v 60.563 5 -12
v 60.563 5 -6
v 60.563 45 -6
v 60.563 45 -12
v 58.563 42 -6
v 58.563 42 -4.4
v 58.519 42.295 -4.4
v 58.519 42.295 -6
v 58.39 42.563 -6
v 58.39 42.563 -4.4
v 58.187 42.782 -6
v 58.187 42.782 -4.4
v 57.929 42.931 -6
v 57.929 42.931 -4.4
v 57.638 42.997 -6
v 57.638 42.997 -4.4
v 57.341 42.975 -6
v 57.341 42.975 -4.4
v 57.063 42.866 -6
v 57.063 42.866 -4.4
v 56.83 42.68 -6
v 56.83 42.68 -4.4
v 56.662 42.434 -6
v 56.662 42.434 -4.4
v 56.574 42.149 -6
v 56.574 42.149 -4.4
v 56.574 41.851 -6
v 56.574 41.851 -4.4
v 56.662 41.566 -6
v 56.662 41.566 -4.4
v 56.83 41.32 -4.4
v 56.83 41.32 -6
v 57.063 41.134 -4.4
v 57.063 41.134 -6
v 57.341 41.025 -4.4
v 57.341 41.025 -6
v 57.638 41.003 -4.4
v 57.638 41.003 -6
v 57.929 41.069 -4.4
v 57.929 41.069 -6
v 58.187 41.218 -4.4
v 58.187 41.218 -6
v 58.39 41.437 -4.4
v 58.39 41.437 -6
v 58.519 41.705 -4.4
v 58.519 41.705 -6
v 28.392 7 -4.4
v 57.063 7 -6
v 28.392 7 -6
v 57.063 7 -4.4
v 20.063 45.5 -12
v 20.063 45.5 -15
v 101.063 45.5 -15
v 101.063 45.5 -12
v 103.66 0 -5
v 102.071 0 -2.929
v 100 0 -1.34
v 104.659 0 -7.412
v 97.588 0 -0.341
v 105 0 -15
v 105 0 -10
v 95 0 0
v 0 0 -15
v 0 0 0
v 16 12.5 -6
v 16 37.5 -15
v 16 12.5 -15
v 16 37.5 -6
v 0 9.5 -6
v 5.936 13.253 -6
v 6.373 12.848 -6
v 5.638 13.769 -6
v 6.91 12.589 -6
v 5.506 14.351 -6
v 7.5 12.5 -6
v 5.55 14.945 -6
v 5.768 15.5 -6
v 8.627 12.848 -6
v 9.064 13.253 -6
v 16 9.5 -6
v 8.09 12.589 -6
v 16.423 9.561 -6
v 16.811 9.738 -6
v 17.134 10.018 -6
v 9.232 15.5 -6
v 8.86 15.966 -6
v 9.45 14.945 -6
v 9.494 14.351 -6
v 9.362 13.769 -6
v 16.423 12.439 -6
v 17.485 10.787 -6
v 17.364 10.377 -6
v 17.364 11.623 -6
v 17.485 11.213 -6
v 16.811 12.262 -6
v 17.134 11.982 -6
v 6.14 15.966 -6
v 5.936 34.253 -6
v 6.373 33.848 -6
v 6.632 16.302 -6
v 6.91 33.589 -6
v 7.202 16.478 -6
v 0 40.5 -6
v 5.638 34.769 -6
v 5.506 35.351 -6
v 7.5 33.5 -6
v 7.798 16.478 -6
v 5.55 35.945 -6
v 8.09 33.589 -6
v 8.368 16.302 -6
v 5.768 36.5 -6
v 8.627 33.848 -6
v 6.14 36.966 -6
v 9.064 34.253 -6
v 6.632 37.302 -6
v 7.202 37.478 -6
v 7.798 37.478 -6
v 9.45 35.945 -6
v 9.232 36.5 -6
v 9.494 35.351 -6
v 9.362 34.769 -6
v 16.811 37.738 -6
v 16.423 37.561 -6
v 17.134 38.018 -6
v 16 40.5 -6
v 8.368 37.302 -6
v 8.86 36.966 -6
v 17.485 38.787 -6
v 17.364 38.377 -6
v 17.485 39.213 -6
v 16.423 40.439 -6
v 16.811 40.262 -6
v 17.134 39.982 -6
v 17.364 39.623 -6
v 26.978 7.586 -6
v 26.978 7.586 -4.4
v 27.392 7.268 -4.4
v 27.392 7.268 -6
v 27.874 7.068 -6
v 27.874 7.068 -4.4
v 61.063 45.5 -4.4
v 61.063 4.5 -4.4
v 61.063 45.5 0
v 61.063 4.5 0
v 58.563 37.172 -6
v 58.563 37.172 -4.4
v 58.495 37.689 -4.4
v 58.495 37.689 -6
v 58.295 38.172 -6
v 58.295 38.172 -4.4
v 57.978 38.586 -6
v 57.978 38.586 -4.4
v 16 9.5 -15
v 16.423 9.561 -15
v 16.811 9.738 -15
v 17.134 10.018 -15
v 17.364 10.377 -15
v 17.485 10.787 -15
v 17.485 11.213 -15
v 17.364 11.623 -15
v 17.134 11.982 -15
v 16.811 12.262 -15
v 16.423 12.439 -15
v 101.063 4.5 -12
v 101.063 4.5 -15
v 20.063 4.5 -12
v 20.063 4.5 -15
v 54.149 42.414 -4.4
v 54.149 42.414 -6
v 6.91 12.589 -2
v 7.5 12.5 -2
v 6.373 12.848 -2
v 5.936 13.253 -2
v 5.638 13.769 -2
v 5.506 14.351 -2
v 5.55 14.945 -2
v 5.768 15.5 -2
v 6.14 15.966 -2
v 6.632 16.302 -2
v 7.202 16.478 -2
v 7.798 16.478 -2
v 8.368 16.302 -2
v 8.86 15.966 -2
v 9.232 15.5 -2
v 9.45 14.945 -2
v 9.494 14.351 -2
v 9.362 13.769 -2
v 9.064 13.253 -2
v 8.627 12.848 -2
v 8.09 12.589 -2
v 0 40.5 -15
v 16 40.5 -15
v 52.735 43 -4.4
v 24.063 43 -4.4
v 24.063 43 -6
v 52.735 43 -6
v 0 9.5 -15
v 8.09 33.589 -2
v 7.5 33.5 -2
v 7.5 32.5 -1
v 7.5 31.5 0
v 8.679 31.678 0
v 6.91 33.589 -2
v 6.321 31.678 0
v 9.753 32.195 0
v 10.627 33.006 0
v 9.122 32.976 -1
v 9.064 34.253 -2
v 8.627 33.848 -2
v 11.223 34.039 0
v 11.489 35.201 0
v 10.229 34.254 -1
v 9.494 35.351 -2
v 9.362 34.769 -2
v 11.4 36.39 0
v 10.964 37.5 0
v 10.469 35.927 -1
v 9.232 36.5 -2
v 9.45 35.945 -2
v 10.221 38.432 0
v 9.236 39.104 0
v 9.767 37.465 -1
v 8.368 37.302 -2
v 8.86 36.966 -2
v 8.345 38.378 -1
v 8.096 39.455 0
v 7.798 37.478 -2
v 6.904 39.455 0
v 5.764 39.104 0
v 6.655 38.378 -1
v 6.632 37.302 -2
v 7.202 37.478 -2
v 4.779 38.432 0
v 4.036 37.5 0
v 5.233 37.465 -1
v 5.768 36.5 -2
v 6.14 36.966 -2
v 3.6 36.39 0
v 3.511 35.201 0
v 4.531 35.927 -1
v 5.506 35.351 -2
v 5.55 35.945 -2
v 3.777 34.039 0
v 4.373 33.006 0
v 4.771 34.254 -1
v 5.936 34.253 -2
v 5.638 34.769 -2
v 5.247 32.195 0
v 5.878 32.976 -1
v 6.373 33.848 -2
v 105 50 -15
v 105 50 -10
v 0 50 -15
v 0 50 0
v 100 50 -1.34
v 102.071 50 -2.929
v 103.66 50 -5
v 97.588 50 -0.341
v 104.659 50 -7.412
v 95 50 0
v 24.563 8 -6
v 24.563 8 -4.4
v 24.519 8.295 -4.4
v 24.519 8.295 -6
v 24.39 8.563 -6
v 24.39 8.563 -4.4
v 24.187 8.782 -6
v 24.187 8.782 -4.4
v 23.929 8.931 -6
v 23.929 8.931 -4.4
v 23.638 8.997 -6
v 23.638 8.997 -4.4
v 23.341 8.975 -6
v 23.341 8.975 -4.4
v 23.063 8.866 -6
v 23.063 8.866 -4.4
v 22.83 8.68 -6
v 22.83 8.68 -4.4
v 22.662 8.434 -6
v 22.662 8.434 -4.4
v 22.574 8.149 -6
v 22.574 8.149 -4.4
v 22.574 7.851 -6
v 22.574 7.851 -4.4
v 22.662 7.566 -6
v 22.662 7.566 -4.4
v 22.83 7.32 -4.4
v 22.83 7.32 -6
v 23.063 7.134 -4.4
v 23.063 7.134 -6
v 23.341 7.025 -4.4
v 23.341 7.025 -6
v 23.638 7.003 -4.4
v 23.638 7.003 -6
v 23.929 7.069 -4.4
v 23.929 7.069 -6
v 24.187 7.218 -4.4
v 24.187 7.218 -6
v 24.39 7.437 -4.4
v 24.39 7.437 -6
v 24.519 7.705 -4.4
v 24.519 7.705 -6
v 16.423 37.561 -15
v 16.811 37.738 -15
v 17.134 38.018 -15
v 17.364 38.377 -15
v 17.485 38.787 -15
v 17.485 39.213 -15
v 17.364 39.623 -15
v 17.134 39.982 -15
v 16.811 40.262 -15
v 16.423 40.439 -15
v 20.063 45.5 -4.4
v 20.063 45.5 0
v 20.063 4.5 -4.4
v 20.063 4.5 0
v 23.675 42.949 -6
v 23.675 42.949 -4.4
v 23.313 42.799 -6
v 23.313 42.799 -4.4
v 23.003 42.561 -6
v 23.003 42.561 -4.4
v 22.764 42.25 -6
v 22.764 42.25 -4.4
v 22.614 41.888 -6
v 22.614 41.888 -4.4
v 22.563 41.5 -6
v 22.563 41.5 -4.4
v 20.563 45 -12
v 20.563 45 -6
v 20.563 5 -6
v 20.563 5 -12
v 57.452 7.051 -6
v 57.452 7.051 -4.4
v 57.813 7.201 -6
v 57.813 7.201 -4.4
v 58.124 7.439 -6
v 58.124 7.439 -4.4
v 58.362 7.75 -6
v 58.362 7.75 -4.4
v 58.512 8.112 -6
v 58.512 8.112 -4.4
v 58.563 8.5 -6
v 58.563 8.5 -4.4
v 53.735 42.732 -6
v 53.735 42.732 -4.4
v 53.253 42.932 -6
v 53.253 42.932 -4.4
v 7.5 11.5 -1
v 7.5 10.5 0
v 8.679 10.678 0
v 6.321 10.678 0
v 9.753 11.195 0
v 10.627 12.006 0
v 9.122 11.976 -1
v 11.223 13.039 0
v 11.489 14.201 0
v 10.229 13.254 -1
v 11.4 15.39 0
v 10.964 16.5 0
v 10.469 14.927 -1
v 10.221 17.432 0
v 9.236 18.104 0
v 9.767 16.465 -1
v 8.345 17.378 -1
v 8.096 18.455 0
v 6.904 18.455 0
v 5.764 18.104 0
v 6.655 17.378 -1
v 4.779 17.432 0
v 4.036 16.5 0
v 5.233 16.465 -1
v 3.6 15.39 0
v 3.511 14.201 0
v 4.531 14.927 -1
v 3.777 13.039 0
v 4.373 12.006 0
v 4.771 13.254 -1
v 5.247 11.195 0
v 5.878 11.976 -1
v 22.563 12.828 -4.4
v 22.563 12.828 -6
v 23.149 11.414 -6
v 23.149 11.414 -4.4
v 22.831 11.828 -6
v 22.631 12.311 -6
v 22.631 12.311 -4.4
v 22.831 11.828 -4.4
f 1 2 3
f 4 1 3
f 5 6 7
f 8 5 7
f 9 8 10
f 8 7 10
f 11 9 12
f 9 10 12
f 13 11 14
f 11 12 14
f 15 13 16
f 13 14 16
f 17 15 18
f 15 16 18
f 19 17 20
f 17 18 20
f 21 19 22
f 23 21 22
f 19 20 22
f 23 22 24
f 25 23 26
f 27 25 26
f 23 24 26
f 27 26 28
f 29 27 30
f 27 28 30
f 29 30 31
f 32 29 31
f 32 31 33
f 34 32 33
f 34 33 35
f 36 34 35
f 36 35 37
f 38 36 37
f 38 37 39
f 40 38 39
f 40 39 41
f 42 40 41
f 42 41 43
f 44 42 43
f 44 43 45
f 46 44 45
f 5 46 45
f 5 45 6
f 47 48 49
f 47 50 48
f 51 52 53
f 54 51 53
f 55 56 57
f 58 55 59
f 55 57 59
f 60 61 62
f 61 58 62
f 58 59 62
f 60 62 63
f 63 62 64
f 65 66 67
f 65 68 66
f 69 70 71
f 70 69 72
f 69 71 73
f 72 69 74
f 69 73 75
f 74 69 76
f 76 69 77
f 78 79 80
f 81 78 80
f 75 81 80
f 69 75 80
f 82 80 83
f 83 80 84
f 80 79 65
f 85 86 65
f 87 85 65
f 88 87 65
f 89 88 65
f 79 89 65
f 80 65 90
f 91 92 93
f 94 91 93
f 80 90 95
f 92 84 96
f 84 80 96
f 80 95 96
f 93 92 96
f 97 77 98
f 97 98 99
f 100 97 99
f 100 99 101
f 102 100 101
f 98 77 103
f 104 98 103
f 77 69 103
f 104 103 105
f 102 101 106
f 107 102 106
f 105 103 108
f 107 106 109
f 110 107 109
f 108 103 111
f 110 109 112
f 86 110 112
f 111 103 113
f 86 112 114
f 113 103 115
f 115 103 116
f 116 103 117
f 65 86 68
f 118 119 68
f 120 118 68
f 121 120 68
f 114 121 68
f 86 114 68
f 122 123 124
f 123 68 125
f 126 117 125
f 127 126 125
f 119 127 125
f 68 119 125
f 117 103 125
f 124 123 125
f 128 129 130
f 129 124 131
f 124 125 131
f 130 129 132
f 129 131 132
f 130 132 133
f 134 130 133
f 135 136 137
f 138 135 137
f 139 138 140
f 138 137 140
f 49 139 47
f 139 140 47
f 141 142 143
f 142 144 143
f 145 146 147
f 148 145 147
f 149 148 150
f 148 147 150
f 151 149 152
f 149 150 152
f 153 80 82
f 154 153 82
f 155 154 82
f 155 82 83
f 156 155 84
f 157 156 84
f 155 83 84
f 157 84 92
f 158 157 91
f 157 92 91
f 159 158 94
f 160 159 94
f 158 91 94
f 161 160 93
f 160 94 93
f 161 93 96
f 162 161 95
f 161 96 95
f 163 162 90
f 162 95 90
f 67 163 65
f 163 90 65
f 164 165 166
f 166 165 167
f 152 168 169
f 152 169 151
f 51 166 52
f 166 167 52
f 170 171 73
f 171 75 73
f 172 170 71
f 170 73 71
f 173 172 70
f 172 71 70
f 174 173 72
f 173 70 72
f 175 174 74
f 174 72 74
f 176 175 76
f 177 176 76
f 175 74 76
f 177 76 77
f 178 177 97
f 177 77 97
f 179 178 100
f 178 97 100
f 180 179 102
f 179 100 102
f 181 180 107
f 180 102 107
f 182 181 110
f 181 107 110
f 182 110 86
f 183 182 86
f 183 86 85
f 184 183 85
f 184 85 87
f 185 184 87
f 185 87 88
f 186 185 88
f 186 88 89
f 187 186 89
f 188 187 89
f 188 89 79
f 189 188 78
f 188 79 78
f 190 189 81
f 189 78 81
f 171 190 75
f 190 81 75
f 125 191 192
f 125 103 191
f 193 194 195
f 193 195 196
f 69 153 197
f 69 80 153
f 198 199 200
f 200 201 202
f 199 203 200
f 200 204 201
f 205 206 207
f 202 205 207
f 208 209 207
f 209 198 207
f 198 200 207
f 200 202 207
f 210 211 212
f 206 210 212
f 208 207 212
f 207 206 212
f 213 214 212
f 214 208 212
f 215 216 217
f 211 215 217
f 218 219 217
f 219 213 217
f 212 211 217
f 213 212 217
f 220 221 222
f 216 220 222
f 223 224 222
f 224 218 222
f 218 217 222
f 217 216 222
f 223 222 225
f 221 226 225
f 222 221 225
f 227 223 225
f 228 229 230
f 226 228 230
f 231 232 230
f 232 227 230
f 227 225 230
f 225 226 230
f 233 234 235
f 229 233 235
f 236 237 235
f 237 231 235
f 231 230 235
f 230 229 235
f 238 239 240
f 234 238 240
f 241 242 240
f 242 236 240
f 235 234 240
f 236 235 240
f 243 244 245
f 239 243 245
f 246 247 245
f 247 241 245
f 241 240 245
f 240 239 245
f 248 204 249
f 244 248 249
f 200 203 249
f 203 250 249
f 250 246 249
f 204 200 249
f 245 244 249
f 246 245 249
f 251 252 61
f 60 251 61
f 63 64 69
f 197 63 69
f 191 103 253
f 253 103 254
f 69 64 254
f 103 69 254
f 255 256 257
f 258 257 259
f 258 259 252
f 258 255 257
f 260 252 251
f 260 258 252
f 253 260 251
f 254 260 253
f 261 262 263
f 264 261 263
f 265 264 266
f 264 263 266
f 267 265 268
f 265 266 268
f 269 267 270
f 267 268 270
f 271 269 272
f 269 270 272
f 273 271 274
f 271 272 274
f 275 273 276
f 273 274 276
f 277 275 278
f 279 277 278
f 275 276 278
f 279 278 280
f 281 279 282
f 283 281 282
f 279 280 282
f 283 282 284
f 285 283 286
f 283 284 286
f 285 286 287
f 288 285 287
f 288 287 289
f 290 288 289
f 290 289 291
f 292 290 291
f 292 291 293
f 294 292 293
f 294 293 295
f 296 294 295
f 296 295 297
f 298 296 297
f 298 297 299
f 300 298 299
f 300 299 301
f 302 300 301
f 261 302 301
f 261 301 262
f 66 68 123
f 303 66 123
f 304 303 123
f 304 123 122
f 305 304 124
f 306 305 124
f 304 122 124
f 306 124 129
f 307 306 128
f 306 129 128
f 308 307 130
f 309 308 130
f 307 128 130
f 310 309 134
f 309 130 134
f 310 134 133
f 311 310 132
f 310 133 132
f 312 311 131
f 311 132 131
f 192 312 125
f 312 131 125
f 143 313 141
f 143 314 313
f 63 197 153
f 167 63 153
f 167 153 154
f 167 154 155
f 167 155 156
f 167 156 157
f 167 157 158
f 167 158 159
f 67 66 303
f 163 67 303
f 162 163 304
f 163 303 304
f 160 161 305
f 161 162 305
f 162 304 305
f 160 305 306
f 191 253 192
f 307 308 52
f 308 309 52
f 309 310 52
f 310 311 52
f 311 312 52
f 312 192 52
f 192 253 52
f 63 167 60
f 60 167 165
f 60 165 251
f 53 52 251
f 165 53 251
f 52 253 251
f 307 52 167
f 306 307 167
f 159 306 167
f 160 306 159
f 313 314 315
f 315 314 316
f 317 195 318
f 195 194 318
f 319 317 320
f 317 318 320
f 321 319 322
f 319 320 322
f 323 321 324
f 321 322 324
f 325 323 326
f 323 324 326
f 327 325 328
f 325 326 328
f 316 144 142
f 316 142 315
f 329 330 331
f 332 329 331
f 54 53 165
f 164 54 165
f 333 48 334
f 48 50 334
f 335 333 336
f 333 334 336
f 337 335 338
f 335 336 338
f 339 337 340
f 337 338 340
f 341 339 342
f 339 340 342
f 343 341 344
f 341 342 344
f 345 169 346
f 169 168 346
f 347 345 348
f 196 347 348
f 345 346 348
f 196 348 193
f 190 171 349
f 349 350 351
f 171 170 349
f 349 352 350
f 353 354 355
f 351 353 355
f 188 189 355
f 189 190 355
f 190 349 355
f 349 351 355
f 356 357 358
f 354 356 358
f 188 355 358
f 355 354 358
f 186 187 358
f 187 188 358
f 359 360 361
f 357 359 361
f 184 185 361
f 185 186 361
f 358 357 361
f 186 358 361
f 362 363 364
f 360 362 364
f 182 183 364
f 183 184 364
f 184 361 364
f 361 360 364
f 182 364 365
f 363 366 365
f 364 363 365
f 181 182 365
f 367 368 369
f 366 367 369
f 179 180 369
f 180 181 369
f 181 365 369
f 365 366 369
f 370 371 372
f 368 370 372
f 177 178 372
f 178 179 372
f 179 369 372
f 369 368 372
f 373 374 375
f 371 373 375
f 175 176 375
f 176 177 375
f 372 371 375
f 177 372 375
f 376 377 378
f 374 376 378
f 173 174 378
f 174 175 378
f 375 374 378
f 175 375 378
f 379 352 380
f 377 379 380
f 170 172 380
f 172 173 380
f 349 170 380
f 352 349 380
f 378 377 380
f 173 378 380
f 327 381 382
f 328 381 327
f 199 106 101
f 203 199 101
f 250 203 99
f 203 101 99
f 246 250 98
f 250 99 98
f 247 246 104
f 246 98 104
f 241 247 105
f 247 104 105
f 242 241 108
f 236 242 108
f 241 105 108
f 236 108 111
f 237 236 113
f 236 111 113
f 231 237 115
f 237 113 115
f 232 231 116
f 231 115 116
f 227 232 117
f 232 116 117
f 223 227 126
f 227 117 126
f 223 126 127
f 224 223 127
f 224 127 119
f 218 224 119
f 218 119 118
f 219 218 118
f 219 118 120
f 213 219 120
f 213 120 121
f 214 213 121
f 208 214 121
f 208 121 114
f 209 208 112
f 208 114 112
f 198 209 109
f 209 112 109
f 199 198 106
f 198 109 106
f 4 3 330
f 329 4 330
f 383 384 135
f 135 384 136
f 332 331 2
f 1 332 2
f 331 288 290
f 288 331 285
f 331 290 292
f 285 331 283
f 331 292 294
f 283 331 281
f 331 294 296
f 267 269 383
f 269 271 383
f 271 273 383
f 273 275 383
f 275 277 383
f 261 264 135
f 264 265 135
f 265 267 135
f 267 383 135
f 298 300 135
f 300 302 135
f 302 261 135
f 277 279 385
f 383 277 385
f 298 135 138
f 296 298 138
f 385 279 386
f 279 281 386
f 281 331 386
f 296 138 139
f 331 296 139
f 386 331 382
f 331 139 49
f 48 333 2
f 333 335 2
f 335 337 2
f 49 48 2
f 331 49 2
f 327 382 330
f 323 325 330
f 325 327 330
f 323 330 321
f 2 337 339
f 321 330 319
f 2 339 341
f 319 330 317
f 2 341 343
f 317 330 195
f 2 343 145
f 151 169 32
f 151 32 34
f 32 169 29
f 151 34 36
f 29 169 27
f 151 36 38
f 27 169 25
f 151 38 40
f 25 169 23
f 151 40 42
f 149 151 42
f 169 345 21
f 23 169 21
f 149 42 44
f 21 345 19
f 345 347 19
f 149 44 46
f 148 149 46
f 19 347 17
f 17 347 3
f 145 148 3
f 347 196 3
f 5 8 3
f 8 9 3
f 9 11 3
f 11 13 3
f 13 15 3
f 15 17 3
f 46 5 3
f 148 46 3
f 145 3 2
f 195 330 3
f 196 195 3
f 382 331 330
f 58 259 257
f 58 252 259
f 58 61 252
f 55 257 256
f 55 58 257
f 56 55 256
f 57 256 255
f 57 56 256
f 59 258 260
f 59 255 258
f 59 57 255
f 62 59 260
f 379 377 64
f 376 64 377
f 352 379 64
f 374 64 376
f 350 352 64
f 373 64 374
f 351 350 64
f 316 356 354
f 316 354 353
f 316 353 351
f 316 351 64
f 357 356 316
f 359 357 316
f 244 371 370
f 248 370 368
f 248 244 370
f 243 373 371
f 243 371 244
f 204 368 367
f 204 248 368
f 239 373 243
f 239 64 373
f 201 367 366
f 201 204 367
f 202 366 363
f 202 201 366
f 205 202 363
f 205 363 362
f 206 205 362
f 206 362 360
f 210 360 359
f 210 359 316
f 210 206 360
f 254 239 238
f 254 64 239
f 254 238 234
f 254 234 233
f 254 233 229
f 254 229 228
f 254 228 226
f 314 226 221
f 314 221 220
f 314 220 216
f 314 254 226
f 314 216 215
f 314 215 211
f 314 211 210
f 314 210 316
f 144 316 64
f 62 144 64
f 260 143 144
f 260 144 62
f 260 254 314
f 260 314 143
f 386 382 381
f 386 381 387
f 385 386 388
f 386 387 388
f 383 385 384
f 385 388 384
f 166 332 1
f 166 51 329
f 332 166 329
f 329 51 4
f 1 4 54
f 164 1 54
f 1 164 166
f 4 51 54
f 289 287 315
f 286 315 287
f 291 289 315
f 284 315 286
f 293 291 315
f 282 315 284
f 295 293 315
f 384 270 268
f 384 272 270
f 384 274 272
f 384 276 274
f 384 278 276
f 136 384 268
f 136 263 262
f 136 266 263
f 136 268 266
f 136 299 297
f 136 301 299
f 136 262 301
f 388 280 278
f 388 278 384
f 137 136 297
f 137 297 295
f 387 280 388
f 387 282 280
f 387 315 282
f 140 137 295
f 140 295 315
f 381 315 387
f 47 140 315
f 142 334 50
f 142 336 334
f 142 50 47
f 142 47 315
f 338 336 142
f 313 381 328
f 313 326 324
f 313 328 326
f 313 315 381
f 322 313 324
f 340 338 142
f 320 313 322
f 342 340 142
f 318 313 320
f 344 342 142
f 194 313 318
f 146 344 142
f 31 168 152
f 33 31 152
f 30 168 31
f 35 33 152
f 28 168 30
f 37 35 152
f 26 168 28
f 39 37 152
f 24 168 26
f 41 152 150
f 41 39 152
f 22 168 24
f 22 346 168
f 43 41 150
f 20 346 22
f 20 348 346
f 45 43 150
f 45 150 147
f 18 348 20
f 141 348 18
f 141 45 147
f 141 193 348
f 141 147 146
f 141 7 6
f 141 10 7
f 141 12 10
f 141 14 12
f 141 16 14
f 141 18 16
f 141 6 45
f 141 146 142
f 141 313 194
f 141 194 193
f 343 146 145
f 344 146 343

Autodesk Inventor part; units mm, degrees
ref_plane "YZ Plane" through (0, 0, 0) normal (1, 0, 0) x (0, 1, 0)
ref_plane "XZ Plane" through (0, 0, 0) normal (0, 1, 0) x (-1, 0, 0)
sketch "Unten" plane through (0, 0, 0) normal (0, 0, 1) x (1, 0, 0)
  line L0 (20.5633, 45) -> (20.5633, 5)
  line L1 (60.5633, 5) -> (60.5633, 45)
  line L2 (60.5633, 45) -> (20.5633, 45)
  line L3 (20.5633, 5) -> (60.5633, 5)
  line L4 (105, 50) -> (0, 50)
  line L5 (105, 0) -> (0, 0)
  line L6 (0, 40.5) -> (16, 40.5)
  line L7 (16, 37.5) -> (16, 12.5)
  line L8 (16, 9.5) -> (0, 9.5)
  line L9 (0, 9.5) -> (0, 40.5)
  line L10 (0, 50) -> (0, 0)
  line L11 (105, 50) -> (105, 0)
  circle A0 centre (23.5633, 8) radius 1
  circle A1 centre (57.5633, 42) radius 1
  line L12 (58.5633, 37.1716) -> (58.5633, 8.5)
  line L13 (57.0633, 7) -> (28.3918, 7)
  line L14 (22.5633, 12.8284) -> (22.5633, 41.5)
  line L15 (24.0633, 43) -> (52.7349, 43)
  line L16 (20.0633, 45.5) -> (61.0633, 45.5)
  line L17 (61.0633, 4.5) -> (20.0633, 4.5)
  arc A2 (57.0633, 7) -> (58.5633, 8.5) centre (57.0633, 8.5) ccw
  arc A3 (24.0633, 43) -> (22.5633, 41.5) centre (24.0633, 41.5) ccw
  line L18 (23.1491, 11.4142) -> (26.9776, 7.5858)
  line L19 (54.1491, 42.4142) -> (57.9776, 38.5858)
  arc A4 (16, 37.5) -> (16, 40.5) centre (16, 39) ccw
  arc A5 (16, 9.5) -> (16, 12.5) centre (16, 11) ccw
  line L20 (20.0633, 45.5) -> (20.0633, 4.5)
  line L21 (61.0633, 4.5) -> (61.0633, 45.5)
  line L22 (0, 25) -> (105, 25) construction
  arc A6 (22.5633, 12.8284) -> (23.1491, 11.4142) centre (24.5633, 12.8284) ccw
  arc A7 (26.9776, 7.5858) -> (28.3918, 7) centre (28.3918, 9) ccw
  arc A8 (58.5633, 37.1716) -> (57.9776, 38.5858) centre (56.5633, 37.1716) ccw
  arc A9 (54.1491, 42.4142) -> (52.7349, 43) centre (52.7349, 41) ccw
  line L23 (50, 0) -> (50, 50) construction
  line L24 (48, 39) -> (48, 40.8)
  line L25 (48, 40.8) -> (44.6, 40.8)
  line L26 (44.6, 40.8) -> (44.6, 39)
  line L27 (44.6, 39) -> (48, 39)
  line L28 (36.2594, 22.5) -> (31.2594, 22.5)
  line L29 (31.2594, 22.5) -> (31.2594, 11.5)
  line L30 (31.2594, 11.5) -> (36.2594, 11.5)
  line L31 (36.2594, 11.5) -> (36.2594, 22.5)
  line L32 (43.6, 9.7) -> (43.6, 13.1)
  line L33 (43.6, 13.1) -> (45.4, 13.1)
  line L34 (45.4, 13.1) -> (45.4, 9.7)
  line L35 (45.4, 9.7) -> (43.6, 9.7)
  point P0 (0, 0)
  point P1 (7.5, 14.5)
  point P2 (7.5, 35.5)
  point P3 (58.5633, 38)
  point P4 (27.5633, 7)
  point P5 (53.5633, 43)
  point P6 (22.5633, 12)
  point P7 (65.5633, 25)
  point P8 (44.7594, 25)
  dimension "d0" = 40
  dimension "d1" = 40
  dimension "d185" = 105
  dimension "d196" = 21
  dimension "d217" = 31
  dimension "d267" = 14.5
  dimension "d268" = 14.5
  dimension "d269" = 50
  dimension "d308" = 9.5
  dimension "d329" = 3
  dimension "d341" = 3
  dimension "d342" = 3
  dimension "d343" = 2
  dimension "d344" = 2
  dimension "d390" = 3
  dimension "d391" = 3
  dimension "d419" = 2
  dimension "d420" = 2
  dimension "d421" = 2
  dimension "d423" = 1.5
  dimension "d424" = 1.5
  dimension "d427" = 0.5
  dimension "d428" = 0.5
  dimension "d431" = 3.5
  dimension "d432" = 3.5
  dimension "d450" = 3.5
  dimension "d451" = 3.5
  dimension "d463" = 3
  dimension "d464" = 1.5
  dimension "d465" = 3
  dimension "d466" = 1.5
  dimension "d482" = 2
  dimension "d515" = 5
  dimension "d516" = 11
  dimension "d517" = 3.4
  dimension "d518" = 1.8
  dimension "d519" = 3.4
  dimension "d520" = 1.8
  dimension "d521" = 7.5
  dimension "d522" = 16
extrude "Extrusion40" add sketch "Unten" against normal blind 15 contours L11 L5 L10 L8 A5 L7 A4 L6 L4 | L16 L21 L17 L20
extrude "Extrusion46" add sketch "Unten" against normal blind 6 contours L2 L1 L3 L0
extrude "Extrusion48" cut sketch "Unten" against normal blind 4.4 contours L2 L1 L3 L0 | L12 A2 L13 A7 L18 A6 L14 A3 L15 A9 L19 A8 | L16 L21 L17 L20 | L27 L26 L25 L24 | L31 L30 L29 L28 | L32 L33 L34 L35
extrude "Extrusion41" add sketch "Unten" against normal blind 6 contours L6 A4 L7 A5 L8 L9
hole "Hole14" at (7.5, 14.5, 0) at (7.5, 35.5, 0) direction (0, 0, -1) diameter 4 end through all
chamfer "Chamfer8" distance 2 angle 45 2 edges at (7.5, 37.5, 0) (7.5, 16.5, 0)
sketch "Side" plane through (0, 0, 0) normal (0, -1, 0) x (1, 0, 0)
  line L0 (105, 0) -> (25, 0)
  line L1 (25, -3.6) -> (105, -3.6)
  line L2 (105, -3.6) -> (105, 0)
  line L3 (25, -3.6) -> (25, 0)
  point P0 (0, 0)
  dimension "d412" = 3.6
  dimension "d443" = 80
  dimension "d479" = 80
fillet "Fillet4" radius 10 1 edges at (105, 25, 0)
ref_plane "Work Plane2" through (0, 0, -15) normal (0, 0, 1) x (1, 0, 0)
sketch "Sketch9" plane through (0, 0, -15) normal (0, 0, 1) x (1, 0, 0)
  line L0 (20.0633, 4.5) -> (20.0633, 45.5) projected
  line L1 (20.0633, 45.5) -> (101.0633, 45.5)
  line L2 (101.0633, 45.5) -> (101.0633, 4.5)
  line L3 (101.0633, 4.5) -> (20.0633, 4.5)
  line L4 (20.0633, 4.5) -> (20.0633, 45.5)
  point P0 (0, 0)
  dimension "d526" = 41
  dimension "d527" = 81
extrude "Extrusion49" cut sketch "Sketch9" along normal blind 3
properties part number "TNS_V3.1_Greiferbacke" material "PVC, Unplasticized"
